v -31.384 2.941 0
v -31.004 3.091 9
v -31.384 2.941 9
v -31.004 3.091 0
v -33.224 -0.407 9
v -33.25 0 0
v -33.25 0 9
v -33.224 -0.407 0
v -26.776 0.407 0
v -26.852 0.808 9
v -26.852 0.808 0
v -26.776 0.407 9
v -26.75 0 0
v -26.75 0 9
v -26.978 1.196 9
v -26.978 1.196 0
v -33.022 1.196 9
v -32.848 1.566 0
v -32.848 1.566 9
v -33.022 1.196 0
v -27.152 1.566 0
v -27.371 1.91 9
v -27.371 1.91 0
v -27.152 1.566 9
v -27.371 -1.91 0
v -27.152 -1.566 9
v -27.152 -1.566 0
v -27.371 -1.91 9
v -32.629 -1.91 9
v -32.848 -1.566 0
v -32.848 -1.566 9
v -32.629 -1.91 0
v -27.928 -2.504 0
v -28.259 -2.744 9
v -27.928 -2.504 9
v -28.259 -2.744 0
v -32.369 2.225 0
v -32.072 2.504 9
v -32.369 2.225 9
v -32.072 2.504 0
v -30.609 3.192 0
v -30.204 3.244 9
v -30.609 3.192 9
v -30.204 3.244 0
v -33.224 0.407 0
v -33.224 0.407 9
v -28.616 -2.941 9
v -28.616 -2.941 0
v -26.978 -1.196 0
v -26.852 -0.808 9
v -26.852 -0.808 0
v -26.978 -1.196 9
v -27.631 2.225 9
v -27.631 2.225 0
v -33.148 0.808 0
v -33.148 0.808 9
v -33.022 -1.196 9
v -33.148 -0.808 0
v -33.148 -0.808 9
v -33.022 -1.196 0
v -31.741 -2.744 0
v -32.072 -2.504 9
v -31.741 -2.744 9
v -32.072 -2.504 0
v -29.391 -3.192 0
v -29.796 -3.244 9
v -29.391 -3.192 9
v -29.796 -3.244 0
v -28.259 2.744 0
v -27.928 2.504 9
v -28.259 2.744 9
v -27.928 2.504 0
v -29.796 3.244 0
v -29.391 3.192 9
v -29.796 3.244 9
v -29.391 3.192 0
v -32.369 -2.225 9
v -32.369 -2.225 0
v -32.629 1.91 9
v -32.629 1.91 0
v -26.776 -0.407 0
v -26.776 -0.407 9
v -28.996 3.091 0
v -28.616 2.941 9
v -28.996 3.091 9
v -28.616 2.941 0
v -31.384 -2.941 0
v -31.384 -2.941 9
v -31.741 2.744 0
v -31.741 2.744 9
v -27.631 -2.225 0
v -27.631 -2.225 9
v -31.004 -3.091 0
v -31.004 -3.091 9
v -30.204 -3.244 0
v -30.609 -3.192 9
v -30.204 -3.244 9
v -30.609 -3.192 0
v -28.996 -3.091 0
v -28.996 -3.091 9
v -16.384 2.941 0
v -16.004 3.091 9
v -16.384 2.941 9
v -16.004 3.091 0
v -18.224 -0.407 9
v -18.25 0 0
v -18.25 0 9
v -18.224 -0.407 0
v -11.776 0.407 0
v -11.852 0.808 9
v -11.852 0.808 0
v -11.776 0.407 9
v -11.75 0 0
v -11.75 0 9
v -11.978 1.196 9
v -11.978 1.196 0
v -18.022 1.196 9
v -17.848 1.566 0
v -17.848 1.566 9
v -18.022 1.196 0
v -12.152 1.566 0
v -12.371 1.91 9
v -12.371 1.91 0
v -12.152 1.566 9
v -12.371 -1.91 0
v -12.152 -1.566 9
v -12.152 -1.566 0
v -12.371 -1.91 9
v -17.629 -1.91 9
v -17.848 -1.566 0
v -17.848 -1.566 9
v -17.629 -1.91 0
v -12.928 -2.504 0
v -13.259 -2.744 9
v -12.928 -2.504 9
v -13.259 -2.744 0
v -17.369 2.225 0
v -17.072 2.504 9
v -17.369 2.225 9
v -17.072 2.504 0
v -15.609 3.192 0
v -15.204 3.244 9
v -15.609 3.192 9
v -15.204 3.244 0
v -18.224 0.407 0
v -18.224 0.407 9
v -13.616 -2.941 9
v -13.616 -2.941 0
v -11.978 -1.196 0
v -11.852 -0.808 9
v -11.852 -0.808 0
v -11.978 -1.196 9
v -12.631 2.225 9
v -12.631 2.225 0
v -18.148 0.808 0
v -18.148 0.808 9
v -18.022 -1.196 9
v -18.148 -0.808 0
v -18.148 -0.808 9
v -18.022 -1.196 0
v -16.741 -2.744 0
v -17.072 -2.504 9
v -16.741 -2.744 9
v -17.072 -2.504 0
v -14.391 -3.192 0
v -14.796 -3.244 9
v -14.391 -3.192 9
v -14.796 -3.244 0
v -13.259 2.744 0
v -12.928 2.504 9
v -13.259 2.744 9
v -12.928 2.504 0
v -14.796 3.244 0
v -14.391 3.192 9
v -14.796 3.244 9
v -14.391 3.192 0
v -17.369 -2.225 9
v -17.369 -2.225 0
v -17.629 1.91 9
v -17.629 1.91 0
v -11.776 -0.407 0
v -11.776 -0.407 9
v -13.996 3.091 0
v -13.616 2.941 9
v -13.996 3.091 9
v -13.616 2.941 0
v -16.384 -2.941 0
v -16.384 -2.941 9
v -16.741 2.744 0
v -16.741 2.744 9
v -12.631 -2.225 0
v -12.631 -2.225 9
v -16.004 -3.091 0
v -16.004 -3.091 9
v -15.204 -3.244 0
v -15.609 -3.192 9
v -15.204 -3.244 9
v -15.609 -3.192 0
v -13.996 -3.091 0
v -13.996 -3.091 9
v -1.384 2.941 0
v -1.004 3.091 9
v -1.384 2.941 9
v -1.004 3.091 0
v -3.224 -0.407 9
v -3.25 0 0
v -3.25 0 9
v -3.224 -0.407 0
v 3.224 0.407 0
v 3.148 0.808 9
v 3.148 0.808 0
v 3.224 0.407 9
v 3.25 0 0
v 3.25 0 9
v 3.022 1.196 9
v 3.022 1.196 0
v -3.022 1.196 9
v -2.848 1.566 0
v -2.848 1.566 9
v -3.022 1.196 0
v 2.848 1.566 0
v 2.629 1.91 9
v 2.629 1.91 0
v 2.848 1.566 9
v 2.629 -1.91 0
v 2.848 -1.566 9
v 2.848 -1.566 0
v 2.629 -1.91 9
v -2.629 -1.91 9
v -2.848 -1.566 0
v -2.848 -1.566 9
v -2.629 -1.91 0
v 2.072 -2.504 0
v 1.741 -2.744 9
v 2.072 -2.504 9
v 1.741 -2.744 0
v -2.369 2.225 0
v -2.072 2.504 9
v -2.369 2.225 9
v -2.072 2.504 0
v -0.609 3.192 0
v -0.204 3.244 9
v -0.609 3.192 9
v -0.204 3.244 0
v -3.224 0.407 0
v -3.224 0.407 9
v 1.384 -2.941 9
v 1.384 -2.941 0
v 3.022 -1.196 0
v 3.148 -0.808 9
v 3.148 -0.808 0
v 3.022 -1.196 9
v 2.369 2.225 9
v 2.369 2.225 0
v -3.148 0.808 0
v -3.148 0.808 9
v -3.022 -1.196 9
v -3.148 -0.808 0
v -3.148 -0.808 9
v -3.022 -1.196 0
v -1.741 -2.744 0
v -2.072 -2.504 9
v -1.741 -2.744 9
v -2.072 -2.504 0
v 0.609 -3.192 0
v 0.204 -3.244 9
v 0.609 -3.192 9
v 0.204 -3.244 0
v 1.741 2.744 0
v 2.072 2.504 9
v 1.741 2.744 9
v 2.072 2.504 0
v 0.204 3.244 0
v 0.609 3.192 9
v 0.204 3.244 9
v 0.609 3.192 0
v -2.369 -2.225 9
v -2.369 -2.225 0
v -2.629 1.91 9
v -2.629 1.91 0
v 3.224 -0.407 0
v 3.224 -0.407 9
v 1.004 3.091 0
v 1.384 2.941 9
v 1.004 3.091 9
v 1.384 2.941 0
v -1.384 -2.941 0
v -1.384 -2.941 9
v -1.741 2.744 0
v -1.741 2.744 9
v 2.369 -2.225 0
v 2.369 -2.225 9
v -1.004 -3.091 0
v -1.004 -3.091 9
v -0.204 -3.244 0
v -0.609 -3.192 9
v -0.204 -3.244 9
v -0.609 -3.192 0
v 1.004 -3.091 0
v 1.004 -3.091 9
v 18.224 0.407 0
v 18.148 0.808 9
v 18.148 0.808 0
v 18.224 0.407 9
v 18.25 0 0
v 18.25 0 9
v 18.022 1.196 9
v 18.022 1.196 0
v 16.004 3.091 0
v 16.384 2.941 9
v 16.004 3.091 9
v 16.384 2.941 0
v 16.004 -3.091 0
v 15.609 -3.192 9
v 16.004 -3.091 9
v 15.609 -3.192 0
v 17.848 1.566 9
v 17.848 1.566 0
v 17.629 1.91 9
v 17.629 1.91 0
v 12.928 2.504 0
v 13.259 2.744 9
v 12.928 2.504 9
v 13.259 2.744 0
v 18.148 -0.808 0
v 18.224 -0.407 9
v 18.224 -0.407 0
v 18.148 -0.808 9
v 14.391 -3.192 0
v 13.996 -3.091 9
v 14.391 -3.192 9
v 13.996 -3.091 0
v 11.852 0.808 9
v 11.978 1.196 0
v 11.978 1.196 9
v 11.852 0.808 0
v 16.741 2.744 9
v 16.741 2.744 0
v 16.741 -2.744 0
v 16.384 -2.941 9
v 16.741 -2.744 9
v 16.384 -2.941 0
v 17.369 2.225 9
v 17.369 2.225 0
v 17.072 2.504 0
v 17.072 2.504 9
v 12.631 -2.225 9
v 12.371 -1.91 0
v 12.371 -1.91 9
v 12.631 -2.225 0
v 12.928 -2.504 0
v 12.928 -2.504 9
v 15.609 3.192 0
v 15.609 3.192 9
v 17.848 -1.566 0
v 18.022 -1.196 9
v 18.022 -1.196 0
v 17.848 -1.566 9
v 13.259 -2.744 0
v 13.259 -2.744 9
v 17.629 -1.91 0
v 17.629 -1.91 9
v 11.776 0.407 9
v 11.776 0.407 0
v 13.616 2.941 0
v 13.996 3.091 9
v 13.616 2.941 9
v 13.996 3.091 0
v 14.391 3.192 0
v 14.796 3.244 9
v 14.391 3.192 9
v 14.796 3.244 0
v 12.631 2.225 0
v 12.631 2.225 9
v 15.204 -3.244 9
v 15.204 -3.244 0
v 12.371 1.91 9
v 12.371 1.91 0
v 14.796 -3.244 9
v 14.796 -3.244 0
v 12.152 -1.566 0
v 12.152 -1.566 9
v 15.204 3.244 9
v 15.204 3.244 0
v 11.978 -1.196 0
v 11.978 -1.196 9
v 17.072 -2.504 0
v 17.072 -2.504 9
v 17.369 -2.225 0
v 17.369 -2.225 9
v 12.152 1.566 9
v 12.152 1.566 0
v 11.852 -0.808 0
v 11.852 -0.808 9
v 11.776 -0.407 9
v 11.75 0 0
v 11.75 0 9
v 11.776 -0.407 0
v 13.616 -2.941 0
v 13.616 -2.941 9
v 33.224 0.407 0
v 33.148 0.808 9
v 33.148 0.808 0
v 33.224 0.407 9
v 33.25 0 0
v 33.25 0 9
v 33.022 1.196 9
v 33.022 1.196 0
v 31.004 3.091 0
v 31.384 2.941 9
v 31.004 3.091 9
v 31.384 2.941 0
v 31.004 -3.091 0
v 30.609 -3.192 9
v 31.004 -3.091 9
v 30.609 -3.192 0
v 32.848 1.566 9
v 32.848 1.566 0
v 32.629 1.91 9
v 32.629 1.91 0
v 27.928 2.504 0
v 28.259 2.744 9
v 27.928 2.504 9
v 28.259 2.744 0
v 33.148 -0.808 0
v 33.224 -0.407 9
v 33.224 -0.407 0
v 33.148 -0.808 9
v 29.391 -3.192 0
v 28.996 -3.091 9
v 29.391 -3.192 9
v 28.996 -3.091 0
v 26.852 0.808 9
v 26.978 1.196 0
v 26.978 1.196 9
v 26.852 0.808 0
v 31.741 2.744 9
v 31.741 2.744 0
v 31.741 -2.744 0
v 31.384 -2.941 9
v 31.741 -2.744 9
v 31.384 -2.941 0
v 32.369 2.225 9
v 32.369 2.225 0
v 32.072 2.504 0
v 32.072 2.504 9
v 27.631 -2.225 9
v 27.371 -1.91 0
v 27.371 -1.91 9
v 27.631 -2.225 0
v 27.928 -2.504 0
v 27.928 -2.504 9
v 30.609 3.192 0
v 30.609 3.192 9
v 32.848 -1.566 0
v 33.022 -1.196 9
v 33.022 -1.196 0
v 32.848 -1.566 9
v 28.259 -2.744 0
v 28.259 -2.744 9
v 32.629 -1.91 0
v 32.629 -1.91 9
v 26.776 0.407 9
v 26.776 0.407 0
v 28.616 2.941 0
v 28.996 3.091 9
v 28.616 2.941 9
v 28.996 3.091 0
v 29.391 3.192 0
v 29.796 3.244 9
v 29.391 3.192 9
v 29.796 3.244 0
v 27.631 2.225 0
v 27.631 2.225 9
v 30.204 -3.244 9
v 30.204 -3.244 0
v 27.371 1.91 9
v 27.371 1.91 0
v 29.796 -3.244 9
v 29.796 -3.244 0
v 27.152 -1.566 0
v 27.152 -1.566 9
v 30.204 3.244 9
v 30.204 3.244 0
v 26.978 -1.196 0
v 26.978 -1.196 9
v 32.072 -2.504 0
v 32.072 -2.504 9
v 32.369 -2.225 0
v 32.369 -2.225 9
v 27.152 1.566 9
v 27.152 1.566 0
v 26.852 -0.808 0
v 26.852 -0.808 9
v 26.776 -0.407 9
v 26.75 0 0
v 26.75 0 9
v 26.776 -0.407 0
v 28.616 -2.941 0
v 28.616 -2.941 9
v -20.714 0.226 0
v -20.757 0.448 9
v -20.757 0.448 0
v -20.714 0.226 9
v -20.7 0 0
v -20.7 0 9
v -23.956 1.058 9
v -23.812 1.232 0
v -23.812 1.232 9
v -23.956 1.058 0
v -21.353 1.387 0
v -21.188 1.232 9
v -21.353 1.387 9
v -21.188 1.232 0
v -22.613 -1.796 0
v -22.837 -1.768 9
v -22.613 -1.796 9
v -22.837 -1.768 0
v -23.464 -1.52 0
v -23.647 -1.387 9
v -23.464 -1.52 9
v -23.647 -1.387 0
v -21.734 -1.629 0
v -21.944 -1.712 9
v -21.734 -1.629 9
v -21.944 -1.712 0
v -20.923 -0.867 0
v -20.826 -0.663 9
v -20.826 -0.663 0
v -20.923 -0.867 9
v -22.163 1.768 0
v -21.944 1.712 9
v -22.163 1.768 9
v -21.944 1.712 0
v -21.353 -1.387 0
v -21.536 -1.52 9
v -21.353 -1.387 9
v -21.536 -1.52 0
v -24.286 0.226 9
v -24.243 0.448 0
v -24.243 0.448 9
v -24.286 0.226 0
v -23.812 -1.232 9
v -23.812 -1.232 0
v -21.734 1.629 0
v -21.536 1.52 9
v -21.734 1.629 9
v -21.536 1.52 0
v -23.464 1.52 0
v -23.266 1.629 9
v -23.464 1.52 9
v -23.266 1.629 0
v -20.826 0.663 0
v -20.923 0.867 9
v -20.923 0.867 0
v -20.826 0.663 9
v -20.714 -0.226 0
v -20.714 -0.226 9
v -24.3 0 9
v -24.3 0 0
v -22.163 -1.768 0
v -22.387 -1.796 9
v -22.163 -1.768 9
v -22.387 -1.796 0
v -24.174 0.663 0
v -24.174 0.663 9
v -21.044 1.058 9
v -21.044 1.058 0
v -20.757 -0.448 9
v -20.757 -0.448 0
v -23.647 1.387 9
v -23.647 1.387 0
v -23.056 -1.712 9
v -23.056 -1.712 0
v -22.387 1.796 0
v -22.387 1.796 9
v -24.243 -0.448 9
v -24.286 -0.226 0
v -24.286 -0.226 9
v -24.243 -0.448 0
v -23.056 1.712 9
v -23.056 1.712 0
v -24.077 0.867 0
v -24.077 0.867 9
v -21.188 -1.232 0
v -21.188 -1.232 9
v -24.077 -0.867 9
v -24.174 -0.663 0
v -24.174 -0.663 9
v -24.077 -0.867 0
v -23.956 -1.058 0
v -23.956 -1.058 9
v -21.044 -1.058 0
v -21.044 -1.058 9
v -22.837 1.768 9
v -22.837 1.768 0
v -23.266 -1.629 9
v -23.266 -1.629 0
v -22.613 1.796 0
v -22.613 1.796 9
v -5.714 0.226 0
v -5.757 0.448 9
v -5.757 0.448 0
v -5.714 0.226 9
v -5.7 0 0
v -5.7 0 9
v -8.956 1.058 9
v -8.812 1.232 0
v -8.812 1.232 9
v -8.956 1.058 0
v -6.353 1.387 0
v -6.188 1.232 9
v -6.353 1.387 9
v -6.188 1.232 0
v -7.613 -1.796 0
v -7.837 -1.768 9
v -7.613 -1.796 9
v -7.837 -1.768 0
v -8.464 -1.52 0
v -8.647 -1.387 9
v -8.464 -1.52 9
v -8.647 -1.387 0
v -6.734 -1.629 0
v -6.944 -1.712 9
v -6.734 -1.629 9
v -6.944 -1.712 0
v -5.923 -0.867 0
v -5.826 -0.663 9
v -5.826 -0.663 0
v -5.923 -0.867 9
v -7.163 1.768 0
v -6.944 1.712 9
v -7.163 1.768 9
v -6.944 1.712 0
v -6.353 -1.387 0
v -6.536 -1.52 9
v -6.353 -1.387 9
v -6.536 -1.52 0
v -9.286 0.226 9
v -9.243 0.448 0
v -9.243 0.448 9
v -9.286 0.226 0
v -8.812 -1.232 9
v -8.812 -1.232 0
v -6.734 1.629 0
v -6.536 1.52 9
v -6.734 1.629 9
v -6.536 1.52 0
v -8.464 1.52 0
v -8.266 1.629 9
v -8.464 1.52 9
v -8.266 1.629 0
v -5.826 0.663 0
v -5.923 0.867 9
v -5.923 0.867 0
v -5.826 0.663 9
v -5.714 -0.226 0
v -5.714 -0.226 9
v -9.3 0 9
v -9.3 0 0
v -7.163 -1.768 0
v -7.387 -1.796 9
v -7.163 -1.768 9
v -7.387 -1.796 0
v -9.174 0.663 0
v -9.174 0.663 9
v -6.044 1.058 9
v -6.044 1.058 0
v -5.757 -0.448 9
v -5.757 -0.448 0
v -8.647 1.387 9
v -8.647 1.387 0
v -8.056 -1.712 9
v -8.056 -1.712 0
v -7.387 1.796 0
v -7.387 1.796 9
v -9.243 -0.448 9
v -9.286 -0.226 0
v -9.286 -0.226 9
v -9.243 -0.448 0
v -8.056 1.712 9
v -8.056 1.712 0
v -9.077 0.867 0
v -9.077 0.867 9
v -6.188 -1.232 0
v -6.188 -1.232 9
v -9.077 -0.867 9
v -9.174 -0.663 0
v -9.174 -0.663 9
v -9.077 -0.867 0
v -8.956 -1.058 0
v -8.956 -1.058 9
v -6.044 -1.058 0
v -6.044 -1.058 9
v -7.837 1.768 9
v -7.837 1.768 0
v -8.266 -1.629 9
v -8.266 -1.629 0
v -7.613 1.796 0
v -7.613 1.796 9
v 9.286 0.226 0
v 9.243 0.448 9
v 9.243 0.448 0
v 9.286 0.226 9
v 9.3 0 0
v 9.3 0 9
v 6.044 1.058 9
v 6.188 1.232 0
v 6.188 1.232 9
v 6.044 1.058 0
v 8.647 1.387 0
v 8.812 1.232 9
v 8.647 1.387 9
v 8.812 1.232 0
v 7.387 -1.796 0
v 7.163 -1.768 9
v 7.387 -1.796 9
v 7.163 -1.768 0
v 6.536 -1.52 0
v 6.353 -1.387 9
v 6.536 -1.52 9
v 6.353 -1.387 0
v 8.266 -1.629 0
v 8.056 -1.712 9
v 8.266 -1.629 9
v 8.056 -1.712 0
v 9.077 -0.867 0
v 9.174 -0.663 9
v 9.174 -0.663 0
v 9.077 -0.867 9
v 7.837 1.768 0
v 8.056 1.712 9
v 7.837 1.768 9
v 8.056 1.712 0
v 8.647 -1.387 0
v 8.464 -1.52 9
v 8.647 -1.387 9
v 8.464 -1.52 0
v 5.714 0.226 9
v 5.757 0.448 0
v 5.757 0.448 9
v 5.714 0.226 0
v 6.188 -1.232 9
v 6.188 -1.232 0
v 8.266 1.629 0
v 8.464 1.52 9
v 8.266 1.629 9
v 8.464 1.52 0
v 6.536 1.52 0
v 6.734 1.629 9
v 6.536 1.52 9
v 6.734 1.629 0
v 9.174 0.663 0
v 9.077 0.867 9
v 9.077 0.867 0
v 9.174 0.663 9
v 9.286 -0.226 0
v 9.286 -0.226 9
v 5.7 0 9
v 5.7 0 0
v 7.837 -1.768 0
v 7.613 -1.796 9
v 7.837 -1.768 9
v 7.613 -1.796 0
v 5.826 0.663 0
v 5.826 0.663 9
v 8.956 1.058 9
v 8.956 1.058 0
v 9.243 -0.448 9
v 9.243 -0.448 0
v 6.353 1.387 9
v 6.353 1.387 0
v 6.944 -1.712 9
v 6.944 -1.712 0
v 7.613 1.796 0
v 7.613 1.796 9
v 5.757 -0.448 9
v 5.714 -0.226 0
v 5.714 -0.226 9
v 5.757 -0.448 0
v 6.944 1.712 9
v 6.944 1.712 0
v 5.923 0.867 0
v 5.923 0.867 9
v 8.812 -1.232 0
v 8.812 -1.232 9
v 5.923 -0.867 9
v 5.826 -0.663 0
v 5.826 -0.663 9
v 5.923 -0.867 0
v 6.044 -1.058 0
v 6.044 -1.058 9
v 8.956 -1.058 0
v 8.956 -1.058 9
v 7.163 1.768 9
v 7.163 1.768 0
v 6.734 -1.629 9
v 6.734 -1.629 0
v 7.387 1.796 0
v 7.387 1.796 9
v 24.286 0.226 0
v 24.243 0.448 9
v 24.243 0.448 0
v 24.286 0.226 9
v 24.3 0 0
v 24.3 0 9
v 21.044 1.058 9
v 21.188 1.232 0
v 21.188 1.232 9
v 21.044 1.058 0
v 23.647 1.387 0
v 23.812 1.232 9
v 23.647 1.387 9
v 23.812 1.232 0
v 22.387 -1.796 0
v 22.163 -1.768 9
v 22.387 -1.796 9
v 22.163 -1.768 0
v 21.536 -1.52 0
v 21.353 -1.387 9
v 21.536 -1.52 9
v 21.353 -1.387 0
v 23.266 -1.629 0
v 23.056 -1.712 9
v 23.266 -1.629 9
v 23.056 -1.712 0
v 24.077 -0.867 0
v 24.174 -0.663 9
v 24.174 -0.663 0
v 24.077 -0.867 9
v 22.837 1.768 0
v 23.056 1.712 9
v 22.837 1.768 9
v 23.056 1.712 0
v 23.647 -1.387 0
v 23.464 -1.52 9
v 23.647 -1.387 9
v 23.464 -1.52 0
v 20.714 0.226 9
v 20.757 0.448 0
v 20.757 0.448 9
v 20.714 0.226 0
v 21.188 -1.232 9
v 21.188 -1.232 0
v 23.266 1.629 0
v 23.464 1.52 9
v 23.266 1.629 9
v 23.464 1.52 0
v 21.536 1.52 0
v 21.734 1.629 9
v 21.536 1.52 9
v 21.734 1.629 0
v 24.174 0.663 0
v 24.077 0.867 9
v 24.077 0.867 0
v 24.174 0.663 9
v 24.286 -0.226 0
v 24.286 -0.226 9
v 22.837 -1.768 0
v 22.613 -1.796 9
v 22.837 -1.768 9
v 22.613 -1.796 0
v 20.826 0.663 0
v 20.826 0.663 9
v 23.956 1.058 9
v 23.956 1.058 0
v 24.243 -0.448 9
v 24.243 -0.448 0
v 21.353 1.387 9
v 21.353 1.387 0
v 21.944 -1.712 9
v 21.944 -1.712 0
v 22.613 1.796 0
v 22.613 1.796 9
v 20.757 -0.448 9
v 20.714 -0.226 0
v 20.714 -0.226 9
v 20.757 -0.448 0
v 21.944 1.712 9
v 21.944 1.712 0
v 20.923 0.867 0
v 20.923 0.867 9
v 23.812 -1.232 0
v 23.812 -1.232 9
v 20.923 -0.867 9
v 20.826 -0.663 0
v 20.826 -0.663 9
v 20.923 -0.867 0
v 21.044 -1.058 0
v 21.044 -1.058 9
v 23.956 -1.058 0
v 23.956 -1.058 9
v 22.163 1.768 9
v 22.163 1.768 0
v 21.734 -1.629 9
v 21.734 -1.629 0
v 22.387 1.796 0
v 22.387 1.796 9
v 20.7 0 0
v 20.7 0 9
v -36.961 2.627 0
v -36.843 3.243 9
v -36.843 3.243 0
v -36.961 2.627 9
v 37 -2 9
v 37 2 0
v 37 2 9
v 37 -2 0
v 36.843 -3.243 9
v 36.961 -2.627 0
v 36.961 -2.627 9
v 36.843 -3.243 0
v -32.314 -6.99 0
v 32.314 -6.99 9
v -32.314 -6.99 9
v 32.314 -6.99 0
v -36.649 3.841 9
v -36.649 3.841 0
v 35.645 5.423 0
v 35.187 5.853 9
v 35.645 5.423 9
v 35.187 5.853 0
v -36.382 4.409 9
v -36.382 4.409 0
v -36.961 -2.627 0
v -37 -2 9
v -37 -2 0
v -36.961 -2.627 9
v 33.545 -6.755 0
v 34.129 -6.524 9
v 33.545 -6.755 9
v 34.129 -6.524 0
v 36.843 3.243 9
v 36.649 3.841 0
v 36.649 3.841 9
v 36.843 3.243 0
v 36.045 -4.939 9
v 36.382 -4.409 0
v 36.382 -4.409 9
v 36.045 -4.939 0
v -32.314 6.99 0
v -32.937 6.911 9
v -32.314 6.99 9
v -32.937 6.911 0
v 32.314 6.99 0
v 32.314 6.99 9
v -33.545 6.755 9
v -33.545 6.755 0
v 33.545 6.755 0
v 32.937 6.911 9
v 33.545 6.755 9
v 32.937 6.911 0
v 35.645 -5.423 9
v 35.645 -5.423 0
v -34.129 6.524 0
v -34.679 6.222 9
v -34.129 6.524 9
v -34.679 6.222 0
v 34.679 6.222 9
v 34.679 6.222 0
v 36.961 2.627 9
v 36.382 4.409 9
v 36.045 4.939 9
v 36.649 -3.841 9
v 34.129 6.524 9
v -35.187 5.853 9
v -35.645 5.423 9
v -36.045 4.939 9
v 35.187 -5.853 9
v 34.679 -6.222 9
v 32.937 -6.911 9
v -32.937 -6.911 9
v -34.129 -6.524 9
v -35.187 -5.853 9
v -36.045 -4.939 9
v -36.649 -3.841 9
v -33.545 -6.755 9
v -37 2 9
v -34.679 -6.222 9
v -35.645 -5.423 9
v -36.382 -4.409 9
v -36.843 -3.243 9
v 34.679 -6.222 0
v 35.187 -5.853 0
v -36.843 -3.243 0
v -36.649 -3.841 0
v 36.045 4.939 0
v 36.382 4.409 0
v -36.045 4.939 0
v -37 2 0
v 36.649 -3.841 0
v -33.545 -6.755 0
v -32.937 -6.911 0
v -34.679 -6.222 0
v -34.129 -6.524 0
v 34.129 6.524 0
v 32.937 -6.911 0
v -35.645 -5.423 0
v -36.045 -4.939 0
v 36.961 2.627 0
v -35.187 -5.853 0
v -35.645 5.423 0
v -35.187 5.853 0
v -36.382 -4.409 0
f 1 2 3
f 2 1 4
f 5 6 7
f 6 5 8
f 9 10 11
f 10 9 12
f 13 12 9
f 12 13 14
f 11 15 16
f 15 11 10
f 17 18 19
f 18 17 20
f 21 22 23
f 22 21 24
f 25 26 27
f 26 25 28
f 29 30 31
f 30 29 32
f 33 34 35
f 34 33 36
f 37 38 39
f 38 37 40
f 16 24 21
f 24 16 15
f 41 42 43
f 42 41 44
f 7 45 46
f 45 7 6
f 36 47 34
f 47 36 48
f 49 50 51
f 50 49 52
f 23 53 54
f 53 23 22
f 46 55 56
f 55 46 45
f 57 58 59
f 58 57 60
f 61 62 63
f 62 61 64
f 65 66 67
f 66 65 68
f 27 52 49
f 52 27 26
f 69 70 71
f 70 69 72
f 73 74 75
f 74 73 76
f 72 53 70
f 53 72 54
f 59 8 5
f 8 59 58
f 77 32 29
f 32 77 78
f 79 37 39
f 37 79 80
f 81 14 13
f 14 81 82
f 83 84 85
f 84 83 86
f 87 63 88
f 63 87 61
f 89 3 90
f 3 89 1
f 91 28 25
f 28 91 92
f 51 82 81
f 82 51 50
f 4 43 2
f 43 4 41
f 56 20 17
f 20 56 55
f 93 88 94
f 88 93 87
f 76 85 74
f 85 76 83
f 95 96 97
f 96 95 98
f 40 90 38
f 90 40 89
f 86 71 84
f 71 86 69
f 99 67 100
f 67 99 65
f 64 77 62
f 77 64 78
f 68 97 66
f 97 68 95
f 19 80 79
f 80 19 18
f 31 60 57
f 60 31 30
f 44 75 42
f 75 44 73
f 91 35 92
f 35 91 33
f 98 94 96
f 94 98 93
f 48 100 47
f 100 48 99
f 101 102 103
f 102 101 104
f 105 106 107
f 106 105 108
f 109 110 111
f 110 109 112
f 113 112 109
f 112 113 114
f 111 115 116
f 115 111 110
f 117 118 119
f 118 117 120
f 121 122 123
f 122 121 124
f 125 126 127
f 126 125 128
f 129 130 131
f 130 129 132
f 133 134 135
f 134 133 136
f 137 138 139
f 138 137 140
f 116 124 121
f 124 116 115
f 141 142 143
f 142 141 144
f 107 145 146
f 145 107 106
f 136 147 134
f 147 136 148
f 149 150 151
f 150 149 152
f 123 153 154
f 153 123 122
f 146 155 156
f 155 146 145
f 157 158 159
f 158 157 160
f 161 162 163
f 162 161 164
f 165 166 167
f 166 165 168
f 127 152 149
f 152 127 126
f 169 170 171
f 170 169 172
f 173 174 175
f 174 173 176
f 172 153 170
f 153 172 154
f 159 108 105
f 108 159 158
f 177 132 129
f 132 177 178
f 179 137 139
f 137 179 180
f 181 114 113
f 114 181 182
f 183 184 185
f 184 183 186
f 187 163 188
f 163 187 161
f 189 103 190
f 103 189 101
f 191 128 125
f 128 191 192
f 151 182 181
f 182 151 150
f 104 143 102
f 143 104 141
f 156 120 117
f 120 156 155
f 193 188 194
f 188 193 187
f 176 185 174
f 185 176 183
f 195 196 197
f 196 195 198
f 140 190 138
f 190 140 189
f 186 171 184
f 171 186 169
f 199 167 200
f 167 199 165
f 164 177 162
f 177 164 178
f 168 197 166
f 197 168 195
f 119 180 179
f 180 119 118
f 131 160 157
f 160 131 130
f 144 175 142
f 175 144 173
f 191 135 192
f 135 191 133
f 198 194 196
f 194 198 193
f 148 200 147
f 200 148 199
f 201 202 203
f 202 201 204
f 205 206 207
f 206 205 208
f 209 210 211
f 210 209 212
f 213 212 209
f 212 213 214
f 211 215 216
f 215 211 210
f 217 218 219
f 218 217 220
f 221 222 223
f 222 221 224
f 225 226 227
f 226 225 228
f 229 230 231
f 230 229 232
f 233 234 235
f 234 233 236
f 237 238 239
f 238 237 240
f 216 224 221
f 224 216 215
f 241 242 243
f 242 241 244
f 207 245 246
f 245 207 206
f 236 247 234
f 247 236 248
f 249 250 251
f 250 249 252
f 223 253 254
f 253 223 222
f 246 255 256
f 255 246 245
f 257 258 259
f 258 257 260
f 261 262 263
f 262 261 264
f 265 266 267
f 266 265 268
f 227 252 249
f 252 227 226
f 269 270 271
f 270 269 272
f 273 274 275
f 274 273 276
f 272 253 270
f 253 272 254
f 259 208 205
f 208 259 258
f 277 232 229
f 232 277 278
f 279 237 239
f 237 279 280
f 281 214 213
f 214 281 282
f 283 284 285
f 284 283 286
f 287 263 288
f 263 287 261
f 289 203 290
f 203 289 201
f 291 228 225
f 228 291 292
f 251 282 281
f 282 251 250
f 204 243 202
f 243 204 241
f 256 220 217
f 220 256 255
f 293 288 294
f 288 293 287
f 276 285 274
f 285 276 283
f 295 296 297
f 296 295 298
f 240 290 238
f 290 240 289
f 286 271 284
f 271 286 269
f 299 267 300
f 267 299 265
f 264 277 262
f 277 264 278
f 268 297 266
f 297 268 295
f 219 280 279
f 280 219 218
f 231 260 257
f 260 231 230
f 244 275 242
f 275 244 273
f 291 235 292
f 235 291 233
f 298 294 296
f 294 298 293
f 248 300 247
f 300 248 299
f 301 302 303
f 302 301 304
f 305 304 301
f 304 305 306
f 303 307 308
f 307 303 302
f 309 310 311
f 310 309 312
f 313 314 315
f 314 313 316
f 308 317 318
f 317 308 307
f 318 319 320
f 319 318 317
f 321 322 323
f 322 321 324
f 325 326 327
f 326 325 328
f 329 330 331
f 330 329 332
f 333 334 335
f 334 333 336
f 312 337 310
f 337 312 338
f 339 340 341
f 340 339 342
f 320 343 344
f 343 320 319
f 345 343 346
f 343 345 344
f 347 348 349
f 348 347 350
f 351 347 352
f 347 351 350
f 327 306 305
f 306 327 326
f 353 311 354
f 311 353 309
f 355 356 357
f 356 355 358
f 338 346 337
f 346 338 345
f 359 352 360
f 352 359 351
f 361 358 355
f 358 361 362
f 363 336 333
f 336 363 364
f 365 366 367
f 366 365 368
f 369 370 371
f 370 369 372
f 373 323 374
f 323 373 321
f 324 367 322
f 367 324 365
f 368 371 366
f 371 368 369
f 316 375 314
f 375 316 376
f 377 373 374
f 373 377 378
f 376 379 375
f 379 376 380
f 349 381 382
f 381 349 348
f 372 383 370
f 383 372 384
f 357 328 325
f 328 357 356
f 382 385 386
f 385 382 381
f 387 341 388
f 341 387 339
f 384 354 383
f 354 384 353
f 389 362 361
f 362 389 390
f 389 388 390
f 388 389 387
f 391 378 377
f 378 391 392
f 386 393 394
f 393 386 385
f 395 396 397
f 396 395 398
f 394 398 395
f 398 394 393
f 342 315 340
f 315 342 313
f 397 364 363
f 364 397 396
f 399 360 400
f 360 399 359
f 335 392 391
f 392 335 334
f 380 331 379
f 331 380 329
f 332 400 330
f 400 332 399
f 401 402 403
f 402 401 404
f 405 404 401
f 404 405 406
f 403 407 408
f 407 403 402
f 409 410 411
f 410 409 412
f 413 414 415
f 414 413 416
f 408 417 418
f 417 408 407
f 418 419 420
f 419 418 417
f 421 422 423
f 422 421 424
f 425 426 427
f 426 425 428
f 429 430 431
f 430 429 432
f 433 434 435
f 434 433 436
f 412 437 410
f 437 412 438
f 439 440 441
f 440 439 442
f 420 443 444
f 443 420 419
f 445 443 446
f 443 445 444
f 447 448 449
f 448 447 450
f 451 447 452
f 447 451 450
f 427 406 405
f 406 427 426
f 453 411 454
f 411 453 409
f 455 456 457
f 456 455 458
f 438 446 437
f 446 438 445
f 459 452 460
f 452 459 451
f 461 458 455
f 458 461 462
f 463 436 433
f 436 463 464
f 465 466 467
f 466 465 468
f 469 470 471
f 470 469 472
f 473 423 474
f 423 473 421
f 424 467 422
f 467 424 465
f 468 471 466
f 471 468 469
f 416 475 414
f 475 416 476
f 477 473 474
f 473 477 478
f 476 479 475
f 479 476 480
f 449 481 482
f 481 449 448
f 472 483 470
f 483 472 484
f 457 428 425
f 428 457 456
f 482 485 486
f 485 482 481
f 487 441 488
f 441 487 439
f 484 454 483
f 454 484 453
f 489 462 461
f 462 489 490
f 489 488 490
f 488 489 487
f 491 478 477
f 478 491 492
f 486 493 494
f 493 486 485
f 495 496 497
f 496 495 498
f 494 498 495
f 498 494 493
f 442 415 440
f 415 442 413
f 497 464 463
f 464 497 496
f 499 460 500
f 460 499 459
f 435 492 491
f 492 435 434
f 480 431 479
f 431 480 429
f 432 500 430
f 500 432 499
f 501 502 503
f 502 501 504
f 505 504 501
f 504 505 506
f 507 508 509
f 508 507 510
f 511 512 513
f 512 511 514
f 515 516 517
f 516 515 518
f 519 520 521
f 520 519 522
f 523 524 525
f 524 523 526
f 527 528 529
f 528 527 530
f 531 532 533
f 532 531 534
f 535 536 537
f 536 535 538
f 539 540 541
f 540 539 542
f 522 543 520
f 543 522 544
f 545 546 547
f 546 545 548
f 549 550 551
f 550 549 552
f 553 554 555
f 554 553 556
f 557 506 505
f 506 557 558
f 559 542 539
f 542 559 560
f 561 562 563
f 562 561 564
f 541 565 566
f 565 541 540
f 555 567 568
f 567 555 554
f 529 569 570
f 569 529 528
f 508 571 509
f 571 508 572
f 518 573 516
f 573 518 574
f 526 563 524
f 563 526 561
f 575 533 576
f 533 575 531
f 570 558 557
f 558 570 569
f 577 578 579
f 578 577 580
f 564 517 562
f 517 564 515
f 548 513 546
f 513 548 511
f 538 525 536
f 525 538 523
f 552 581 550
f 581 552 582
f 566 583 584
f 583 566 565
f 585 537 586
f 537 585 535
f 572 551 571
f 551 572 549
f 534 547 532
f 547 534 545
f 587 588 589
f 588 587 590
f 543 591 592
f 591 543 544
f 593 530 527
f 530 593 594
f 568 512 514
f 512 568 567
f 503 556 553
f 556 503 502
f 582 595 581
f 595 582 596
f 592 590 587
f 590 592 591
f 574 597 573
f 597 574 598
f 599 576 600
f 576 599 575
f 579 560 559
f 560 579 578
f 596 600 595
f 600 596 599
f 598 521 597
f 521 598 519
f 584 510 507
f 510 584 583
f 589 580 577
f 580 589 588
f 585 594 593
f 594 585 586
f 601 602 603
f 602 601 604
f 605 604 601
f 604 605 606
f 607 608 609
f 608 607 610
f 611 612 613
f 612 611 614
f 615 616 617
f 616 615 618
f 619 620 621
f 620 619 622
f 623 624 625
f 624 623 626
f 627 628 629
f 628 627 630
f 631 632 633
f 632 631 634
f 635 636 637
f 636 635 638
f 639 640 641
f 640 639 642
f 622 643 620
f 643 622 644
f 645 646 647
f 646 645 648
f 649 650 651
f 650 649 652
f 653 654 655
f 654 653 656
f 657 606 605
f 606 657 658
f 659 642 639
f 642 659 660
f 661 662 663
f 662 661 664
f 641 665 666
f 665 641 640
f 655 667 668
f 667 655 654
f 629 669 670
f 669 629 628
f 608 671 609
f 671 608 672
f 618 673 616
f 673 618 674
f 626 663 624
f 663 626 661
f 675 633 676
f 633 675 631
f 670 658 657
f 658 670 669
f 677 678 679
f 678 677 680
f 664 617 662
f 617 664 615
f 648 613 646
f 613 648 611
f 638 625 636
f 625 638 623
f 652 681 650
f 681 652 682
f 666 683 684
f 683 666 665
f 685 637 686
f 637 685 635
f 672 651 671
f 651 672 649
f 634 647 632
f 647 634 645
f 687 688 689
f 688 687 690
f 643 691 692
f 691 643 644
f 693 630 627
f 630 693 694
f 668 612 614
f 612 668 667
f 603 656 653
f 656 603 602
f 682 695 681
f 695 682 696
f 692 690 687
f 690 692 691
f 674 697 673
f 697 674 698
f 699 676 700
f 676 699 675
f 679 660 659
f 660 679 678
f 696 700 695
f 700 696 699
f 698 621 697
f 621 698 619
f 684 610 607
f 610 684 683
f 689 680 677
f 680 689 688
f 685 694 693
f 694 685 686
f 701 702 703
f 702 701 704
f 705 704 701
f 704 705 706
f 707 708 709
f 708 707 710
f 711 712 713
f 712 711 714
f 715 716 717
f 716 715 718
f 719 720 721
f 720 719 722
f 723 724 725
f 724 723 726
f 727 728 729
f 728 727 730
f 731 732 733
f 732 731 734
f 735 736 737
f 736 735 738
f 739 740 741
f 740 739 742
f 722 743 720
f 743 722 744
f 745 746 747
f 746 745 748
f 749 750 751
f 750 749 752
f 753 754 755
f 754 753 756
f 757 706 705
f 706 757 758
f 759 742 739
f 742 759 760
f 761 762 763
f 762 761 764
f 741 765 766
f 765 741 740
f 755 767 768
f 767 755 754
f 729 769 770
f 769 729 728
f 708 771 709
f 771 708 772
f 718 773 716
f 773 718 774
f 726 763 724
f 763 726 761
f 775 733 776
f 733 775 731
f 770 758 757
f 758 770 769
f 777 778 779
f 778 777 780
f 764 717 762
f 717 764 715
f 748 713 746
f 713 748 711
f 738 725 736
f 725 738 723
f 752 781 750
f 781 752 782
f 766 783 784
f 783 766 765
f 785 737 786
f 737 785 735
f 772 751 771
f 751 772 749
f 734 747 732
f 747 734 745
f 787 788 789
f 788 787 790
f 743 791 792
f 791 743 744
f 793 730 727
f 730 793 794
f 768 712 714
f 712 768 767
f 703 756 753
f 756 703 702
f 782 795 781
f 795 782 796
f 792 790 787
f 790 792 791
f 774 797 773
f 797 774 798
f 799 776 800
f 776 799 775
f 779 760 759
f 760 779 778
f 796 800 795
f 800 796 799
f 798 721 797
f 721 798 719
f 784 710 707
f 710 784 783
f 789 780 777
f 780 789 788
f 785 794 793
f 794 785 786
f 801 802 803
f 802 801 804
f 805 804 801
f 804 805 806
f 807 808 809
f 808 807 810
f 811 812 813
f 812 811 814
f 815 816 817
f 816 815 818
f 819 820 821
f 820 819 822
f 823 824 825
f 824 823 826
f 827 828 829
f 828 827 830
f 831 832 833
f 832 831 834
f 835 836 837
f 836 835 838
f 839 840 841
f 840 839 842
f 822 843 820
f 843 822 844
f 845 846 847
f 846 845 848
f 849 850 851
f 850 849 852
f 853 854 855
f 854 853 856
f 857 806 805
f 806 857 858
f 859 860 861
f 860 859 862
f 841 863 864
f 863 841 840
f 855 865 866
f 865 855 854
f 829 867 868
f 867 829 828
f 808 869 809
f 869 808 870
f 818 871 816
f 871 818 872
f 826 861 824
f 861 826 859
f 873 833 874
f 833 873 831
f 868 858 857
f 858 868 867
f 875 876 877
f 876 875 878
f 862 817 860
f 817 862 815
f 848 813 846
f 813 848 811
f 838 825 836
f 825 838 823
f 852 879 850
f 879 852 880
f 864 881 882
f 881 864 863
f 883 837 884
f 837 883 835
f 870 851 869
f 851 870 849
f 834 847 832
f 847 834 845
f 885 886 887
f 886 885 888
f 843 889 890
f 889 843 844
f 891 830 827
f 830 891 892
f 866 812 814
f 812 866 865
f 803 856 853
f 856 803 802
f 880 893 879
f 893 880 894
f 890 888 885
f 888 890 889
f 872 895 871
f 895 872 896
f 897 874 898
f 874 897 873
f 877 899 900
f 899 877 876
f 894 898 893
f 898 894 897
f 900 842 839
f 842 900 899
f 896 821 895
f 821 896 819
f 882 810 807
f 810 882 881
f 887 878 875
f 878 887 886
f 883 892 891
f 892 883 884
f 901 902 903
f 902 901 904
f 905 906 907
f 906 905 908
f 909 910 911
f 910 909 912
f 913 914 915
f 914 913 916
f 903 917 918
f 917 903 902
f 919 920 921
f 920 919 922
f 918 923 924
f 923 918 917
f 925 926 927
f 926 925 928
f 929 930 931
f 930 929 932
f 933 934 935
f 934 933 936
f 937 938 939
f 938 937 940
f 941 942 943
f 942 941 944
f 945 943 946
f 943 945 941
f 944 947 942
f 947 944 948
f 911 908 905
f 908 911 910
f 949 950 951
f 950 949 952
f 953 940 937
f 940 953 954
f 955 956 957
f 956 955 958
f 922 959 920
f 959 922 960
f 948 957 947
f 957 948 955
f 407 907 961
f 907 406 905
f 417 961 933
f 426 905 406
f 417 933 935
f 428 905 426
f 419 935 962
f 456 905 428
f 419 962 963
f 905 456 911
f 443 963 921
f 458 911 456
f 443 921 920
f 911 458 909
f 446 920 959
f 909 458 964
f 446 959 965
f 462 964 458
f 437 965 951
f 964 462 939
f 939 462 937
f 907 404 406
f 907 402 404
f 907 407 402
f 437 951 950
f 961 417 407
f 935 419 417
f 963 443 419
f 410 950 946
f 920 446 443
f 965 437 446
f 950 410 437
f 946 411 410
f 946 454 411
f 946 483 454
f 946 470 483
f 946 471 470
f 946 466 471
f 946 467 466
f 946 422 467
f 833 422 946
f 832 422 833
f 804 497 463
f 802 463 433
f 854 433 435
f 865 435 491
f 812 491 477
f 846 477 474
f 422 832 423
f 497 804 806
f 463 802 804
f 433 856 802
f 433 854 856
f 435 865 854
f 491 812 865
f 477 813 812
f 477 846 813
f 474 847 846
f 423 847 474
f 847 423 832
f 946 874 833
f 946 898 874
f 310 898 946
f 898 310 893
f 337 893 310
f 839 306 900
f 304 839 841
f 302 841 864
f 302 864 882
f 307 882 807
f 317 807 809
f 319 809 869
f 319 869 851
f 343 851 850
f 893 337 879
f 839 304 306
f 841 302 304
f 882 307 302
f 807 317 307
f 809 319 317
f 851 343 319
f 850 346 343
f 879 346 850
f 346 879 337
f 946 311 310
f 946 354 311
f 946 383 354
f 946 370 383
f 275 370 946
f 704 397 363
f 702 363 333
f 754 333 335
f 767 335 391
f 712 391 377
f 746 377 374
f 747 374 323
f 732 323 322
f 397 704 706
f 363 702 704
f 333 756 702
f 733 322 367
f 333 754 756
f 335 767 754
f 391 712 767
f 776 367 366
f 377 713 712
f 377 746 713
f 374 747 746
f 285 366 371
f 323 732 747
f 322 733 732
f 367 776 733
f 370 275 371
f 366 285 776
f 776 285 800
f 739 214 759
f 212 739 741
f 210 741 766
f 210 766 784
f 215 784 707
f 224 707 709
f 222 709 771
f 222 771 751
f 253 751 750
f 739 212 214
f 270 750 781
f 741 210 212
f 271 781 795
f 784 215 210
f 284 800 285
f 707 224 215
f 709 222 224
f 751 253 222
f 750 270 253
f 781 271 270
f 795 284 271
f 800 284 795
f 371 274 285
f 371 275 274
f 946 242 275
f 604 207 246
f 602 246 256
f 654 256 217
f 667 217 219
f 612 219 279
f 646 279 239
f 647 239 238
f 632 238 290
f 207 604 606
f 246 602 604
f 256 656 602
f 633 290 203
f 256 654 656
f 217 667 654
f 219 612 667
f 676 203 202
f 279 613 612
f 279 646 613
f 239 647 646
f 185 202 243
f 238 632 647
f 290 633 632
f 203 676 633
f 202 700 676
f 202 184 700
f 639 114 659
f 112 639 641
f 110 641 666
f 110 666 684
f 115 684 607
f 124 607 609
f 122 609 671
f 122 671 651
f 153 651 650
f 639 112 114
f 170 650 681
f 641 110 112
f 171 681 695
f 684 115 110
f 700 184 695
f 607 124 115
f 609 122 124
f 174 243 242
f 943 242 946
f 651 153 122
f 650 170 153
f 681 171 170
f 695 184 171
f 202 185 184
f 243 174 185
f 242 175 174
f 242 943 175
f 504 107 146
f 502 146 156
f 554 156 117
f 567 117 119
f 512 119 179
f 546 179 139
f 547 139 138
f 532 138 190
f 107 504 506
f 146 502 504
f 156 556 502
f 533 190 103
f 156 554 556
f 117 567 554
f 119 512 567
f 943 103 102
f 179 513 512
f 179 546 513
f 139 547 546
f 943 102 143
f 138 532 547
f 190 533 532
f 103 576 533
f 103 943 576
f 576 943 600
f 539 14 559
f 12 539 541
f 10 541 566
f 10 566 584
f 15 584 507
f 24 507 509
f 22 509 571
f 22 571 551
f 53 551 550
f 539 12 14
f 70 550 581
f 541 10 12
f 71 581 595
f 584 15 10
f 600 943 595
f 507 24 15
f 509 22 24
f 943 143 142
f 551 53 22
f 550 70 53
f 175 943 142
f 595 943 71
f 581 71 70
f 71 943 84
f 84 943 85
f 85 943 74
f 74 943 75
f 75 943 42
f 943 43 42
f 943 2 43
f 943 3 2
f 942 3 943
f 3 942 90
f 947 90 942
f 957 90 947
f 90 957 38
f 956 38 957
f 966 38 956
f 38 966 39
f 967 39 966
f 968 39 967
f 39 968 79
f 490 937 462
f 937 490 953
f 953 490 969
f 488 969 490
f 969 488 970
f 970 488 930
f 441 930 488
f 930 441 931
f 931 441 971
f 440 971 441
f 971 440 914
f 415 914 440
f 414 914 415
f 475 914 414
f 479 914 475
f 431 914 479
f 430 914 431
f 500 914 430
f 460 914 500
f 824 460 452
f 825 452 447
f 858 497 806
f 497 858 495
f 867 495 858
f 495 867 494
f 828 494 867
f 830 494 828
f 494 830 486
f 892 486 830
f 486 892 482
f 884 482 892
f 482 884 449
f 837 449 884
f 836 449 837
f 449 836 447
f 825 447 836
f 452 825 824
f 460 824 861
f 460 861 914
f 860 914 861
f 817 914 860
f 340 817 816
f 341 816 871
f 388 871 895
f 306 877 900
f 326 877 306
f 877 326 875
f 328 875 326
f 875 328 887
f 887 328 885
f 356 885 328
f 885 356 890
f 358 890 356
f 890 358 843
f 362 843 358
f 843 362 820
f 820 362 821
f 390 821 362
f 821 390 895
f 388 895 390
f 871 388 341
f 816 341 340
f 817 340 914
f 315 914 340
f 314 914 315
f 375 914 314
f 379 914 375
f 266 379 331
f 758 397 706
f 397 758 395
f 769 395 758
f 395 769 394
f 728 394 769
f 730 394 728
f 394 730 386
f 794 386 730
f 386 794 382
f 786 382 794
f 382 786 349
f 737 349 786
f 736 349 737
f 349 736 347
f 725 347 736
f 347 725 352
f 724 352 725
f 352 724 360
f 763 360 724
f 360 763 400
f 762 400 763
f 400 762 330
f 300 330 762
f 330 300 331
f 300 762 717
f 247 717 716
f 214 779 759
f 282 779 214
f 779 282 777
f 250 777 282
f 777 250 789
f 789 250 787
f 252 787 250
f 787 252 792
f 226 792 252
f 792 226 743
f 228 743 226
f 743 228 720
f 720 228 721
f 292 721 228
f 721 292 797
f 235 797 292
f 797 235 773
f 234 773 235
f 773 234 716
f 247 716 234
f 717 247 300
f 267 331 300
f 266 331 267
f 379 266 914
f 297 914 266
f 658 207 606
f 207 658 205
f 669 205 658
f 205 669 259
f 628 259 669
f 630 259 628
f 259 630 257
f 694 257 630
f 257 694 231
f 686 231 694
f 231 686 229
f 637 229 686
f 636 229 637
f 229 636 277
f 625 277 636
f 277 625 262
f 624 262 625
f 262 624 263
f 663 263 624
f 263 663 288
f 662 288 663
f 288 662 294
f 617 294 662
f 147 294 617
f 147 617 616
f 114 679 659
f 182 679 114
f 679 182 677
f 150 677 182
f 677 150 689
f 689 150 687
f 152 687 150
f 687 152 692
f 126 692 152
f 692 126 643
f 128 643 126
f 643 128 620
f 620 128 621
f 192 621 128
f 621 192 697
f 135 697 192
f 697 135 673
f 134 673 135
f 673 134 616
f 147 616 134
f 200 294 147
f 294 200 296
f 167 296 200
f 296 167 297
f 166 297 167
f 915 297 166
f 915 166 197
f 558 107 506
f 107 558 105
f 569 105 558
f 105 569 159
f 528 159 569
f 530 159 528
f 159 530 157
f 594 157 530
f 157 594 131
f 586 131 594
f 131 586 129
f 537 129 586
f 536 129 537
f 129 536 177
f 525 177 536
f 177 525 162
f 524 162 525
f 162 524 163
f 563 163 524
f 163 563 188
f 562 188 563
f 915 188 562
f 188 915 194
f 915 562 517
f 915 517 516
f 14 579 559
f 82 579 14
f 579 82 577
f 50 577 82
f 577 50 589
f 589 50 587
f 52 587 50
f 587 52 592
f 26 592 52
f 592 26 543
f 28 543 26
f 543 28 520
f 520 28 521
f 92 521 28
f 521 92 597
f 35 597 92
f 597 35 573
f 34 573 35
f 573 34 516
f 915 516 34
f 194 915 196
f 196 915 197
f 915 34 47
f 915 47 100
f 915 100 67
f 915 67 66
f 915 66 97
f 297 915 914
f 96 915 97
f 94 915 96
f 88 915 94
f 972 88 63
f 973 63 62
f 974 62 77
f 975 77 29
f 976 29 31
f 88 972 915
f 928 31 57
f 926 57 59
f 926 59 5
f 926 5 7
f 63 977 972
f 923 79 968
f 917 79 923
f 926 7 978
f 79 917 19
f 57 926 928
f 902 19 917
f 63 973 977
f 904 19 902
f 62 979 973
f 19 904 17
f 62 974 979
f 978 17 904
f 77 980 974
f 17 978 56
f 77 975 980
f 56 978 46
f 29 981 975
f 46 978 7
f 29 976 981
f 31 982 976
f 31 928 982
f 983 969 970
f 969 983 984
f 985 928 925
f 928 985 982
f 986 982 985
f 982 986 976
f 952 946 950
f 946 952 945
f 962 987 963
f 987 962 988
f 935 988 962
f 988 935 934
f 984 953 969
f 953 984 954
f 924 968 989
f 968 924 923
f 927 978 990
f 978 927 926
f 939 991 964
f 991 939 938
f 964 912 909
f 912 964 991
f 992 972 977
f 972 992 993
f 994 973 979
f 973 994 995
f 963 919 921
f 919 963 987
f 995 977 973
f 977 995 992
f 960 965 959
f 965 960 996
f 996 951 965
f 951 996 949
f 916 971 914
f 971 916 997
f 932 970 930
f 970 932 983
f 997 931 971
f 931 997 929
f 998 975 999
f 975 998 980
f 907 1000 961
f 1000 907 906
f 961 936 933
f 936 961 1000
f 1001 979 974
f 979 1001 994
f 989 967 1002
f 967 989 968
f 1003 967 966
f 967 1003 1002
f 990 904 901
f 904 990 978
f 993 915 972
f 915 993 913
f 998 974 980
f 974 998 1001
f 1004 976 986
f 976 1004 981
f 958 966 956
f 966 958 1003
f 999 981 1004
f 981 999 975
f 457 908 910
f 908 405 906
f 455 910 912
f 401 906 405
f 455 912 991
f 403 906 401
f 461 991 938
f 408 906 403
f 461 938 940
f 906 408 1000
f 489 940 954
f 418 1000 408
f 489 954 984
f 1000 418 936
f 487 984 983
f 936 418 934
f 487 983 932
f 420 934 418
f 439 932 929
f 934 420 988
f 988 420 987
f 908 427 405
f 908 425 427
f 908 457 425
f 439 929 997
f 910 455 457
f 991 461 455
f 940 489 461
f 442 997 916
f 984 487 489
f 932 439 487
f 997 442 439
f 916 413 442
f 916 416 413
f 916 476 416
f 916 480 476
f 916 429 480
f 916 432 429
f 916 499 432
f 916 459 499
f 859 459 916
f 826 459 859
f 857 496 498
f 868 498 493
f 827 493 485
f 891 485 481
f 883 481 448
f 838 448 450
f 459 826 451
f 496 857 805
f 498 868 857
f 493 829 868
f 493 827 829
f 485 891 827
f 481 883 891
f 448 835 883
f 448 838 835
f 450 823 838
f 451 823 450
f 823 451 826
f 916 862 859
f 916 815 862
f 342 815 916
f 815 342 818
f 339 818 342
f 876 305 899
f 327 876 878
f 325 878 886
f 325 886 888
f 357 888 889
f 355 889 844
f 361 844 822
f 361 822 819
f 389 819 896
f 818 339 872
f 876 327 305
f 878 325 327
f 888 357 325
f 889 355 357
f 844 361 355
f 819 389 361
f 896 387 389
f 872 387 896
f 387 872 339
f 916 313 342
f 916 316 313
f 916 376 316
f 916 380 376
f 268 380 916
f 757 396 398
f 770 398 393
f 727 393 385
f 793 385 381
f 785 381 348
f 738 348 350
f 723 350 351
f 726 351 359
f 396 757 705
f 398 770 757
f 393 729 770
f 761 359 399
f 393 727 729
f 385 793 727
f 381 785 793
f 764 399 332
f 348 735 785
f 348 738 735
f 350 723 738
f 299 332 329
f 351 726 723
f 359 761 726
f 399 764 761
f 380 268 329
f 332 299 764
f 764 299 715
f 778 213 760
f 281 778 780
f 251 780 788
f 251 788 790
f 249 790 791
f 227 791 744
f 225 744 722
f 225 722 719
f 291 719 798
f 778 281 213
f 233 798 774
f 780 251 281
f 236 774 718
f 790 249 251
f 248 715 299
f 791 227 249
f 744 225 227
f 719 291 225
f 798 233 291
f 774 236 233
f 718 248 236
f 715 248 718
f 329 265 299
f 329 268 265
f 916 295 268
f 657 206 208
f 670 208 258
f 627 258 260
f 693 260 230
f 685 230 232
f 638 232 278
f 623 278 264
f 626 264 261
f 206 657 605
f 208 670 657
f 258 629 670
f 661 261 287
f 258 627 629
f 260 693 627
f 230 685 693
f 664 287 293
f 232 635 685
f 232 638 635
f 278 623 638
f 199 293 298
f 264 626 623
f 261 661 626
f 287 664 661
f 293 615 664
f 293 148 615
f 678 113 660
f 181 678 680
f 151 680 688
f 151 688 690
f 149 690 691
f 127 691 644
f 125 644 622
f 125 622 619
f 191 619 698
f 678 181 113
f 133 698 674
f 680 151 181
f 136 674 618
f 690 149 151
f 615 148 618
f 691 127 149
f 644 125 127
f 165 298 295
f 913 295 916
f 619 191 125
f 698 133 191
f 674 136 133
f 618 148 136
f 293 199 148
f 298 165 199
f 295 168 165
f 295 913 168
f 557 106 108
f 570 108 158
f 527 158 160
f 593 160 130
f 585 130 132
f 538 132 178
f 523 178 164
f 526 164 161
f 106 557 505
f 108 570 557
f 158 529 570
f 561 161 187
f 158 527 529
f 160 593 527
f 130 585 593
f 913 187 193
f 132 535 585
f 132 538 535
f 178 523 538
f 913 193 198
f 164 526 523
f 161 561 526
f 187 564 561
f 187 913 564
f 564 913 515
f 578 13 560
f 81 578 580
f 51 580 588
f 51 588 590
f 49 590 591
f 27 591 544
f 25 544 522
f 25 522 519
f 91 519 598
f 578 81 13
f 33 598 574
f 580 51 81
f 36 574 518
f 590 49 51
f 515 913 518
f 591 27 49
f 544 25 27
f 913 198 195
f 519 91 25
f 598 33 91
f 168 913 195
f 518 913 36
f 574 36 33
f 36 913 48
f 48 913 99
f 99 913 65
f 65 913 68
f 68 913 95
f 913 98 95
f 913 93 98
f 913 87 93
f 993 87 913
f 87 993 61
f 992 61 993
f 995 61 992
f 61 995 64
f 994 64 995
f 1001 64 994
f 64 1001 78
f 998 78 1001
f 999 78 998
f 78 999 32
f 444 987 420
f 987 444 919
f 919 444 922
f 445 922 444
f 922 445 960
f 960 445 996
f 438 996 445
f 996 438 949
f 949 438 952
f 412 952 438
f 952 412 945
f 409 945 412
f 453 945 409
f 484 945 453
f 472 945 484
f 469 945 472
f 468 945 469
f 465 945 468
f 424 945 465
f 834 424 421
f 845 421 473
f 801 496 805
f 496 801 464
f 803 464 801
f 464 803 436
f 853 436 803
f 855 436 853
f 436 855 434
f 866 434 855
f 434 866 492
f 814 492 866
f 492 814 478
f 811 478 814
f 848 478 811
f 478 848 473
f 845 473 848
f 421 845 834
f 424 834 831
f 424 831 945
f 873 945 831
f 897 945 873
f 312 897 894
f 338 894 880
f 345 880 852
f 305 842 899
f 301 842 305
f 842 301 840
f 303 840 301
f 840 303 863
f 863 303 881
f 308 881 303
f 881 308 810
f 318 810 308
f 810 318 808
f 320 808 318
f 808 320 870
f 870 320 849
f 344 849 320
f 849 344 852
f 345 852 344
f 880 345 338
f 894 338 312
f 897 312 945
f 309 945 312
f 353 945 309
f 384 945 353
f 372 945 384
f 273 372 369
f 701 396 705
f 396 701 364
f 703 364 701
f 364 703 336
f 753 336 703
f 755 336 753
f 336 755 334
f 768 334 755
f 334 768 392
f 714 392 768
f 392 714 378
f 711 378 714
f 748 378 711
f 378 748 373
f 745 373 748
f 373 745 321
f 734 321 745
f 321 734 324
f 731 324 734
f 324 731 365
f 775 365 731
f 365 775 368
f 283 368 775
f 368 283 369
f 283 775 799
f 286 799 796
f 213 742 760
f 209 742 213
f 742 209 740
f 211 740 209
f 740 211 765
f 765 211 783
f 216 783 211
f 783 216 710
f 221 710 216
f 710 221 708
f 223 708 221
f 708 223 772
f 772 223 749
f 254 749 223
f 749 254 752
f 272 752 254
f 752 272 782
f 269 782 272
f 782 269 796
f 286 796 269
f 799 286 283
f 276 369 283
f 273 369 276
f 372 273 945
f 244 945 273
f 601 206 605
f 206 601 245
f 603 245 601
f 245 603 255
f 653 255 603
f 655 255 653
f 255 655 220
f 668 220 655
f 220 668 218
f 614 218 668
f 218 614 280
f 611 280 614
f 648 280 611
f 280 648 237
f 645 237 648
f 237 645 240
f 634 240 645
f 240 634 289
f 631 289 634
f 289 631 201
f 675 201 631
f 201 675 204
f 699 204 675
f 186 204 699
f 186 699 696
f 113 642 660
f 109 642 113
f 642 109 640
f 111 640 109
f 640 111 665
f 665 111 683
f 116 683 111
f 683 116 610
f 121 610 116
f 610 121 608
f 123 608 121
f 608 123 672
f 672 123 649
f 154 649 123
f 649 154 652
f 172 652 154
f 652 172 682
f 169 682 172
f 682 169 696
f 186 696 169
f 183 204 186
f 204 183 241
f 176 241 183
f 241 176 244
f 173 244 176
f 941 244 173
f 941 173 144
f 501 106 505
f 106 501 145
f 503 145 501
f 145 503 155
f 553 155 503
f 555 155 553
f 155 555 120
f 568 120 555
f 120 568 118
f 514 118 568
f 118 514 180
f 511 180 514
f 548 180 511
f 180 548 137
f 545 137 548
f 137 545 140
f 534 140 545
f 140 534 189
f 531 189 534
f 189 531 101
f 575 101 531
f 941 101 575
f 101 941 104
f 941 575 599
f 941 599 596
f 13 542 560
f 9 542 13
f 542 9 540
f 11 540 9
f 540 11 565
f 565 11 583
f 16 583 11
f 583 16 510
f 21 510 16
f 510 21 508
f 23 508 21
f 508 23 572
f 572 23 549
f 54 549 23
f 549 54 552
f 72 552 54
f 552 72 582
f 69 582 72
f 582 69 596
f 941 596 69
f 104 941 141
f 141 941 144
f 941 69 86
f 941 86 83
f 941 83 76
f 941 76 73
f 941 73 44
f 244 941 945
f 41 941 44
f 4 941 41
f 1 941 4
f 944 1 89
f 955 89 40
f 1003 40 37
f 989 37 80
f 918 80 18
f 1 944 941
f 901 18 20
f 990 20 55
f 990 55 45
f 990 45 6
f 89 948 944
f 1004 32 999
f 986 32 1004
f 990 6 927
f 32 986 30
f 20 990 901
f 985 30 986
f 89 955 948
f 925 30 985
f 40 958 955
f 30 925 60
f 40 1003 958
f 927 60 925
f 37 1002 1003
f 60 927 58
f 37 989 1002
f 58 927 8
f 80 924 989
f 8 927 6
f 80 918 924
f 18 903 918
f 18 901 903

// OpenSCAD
$fn = 50;


difference() {
	union() {
		*color(alpha = 1.0000000000, c = "gray") {
			translate(v = [0, 7, 0]) {
				linear_extrude(height = 1) {
					text(font = "Arial:style=Bold", halign = "center", size = 4.5000000000, text = "COMMENT plate main", valign = "center");
				}
			}
		}
		hull() {
			translate(v = [-32.0000000000, 2.0000000000, 0]) {
				cylinder(h = 9, r = 5);
			}
			translate(v = [32.0000000000, 2.0000000000, 0]) {
				cylinder(h = 9, r = 5);
			}
			translate(v = [-32.0000000000, -2.0000000000, 0]) {
				cylinder(h = 9, r = 5);
			}
			translate(v = [32.0000000000, -2.0000000000, 0]) {
				cylinder(h = 9, r = 5);
			}
		}
	}
	union() {
		*color(alpha = 1.0000000000, c = "gray") {
			translate(v = [0, 7, 0]) {
				linear_extrude(height = 1) {
					text(font = "Arial:style=Bold", halign = "center", size = 4.5000000000, text = "COMMENT holes main", valign = "center");
				}
			}
		}
		translate(v = [-30.0000000000, 0.0000000000, 0]) {
			translate(v = [0, 0, -100]) {
				cylinder(h = 200, r = 3.2500000000);
			}
		}
		translate(v = [-15.0000000000, 0.0000000000, 0]) {
			translate(v = [0, 0, -100]) {
				cylinder(h = 200, r = 3.2500000000);
			}
		}
		translate(v = [0, 0, -100]) {
			cylinder(h = 200, r = 3.2500000000);
		}
		translate(v = [15.0000000000, 0.0000000000, 0]) {
			translate(v = [0, 0, -100]) {
				cylinder(h = 200, r = 3.2500000000);
			}
		}
		translate(v = [30.0000000000, 0.0000000000, 0]) {
			translate(v = [0, 0, -100]) {
				cylinder(h = 200, r = 3.2500000000);
			}
		}
		translate(v = [-30.0000000000, 0.0000000000, 0]) {
			translate(v = [0, 0, -100]) {
				cylinder(h = 200, r = 1.8000000000);
			}
		}
		translate(v = [-22.5000000000, 0.0000000000, 0]) {
			translate(v = [0, 0, -100]) {
				cylinder(h = 200, r = 1.8000000000);
			}
		}
		translate(v = [-15.0000000000, 0.0000000000, 0]) {
			translate(v = [0, 0, -100]) {
				cylinder(h = 200, r = 1.8000000000);
			}
		}
		translate(v = [-7.5000000000, 0.0000000000, 0]) {
			translate(v = [0, 0, -100]) {
				cylinder(h = 200, r = 1.8000000000);
			}
		}
		translate(v = [0, 0, -100]) {
			cylinder(h = 200, r = 1.8000000000);
		}
		translate(v = [7.5000000000, 0.0000000000, 0]) {
			translate(v = [0, 0, -100]) {
				cylinder(h = 200, r = 1.8000000000);
			}
		}
		translate(v = [15.0000000000, 0.0000000000, 0]) {
			translate(v = [0, 0, -100]) {
				cylinder(h = 200, r = 1.8000000000);
			}
		}
		translate(v = [22.5000000000, 0.0000000000, 0]) {
			translate(v = [0, 0, -100]) {
				cylinder(h = 200, r = 1.8000000000);
			}
		}
		translate(v = [30.0000000000, 0.0000000000, 0]) {
			translate(v = [0, 0, -100]) {
				cylinder(h = 200, r = 1.8000000000);
			}
		}
	}
}
